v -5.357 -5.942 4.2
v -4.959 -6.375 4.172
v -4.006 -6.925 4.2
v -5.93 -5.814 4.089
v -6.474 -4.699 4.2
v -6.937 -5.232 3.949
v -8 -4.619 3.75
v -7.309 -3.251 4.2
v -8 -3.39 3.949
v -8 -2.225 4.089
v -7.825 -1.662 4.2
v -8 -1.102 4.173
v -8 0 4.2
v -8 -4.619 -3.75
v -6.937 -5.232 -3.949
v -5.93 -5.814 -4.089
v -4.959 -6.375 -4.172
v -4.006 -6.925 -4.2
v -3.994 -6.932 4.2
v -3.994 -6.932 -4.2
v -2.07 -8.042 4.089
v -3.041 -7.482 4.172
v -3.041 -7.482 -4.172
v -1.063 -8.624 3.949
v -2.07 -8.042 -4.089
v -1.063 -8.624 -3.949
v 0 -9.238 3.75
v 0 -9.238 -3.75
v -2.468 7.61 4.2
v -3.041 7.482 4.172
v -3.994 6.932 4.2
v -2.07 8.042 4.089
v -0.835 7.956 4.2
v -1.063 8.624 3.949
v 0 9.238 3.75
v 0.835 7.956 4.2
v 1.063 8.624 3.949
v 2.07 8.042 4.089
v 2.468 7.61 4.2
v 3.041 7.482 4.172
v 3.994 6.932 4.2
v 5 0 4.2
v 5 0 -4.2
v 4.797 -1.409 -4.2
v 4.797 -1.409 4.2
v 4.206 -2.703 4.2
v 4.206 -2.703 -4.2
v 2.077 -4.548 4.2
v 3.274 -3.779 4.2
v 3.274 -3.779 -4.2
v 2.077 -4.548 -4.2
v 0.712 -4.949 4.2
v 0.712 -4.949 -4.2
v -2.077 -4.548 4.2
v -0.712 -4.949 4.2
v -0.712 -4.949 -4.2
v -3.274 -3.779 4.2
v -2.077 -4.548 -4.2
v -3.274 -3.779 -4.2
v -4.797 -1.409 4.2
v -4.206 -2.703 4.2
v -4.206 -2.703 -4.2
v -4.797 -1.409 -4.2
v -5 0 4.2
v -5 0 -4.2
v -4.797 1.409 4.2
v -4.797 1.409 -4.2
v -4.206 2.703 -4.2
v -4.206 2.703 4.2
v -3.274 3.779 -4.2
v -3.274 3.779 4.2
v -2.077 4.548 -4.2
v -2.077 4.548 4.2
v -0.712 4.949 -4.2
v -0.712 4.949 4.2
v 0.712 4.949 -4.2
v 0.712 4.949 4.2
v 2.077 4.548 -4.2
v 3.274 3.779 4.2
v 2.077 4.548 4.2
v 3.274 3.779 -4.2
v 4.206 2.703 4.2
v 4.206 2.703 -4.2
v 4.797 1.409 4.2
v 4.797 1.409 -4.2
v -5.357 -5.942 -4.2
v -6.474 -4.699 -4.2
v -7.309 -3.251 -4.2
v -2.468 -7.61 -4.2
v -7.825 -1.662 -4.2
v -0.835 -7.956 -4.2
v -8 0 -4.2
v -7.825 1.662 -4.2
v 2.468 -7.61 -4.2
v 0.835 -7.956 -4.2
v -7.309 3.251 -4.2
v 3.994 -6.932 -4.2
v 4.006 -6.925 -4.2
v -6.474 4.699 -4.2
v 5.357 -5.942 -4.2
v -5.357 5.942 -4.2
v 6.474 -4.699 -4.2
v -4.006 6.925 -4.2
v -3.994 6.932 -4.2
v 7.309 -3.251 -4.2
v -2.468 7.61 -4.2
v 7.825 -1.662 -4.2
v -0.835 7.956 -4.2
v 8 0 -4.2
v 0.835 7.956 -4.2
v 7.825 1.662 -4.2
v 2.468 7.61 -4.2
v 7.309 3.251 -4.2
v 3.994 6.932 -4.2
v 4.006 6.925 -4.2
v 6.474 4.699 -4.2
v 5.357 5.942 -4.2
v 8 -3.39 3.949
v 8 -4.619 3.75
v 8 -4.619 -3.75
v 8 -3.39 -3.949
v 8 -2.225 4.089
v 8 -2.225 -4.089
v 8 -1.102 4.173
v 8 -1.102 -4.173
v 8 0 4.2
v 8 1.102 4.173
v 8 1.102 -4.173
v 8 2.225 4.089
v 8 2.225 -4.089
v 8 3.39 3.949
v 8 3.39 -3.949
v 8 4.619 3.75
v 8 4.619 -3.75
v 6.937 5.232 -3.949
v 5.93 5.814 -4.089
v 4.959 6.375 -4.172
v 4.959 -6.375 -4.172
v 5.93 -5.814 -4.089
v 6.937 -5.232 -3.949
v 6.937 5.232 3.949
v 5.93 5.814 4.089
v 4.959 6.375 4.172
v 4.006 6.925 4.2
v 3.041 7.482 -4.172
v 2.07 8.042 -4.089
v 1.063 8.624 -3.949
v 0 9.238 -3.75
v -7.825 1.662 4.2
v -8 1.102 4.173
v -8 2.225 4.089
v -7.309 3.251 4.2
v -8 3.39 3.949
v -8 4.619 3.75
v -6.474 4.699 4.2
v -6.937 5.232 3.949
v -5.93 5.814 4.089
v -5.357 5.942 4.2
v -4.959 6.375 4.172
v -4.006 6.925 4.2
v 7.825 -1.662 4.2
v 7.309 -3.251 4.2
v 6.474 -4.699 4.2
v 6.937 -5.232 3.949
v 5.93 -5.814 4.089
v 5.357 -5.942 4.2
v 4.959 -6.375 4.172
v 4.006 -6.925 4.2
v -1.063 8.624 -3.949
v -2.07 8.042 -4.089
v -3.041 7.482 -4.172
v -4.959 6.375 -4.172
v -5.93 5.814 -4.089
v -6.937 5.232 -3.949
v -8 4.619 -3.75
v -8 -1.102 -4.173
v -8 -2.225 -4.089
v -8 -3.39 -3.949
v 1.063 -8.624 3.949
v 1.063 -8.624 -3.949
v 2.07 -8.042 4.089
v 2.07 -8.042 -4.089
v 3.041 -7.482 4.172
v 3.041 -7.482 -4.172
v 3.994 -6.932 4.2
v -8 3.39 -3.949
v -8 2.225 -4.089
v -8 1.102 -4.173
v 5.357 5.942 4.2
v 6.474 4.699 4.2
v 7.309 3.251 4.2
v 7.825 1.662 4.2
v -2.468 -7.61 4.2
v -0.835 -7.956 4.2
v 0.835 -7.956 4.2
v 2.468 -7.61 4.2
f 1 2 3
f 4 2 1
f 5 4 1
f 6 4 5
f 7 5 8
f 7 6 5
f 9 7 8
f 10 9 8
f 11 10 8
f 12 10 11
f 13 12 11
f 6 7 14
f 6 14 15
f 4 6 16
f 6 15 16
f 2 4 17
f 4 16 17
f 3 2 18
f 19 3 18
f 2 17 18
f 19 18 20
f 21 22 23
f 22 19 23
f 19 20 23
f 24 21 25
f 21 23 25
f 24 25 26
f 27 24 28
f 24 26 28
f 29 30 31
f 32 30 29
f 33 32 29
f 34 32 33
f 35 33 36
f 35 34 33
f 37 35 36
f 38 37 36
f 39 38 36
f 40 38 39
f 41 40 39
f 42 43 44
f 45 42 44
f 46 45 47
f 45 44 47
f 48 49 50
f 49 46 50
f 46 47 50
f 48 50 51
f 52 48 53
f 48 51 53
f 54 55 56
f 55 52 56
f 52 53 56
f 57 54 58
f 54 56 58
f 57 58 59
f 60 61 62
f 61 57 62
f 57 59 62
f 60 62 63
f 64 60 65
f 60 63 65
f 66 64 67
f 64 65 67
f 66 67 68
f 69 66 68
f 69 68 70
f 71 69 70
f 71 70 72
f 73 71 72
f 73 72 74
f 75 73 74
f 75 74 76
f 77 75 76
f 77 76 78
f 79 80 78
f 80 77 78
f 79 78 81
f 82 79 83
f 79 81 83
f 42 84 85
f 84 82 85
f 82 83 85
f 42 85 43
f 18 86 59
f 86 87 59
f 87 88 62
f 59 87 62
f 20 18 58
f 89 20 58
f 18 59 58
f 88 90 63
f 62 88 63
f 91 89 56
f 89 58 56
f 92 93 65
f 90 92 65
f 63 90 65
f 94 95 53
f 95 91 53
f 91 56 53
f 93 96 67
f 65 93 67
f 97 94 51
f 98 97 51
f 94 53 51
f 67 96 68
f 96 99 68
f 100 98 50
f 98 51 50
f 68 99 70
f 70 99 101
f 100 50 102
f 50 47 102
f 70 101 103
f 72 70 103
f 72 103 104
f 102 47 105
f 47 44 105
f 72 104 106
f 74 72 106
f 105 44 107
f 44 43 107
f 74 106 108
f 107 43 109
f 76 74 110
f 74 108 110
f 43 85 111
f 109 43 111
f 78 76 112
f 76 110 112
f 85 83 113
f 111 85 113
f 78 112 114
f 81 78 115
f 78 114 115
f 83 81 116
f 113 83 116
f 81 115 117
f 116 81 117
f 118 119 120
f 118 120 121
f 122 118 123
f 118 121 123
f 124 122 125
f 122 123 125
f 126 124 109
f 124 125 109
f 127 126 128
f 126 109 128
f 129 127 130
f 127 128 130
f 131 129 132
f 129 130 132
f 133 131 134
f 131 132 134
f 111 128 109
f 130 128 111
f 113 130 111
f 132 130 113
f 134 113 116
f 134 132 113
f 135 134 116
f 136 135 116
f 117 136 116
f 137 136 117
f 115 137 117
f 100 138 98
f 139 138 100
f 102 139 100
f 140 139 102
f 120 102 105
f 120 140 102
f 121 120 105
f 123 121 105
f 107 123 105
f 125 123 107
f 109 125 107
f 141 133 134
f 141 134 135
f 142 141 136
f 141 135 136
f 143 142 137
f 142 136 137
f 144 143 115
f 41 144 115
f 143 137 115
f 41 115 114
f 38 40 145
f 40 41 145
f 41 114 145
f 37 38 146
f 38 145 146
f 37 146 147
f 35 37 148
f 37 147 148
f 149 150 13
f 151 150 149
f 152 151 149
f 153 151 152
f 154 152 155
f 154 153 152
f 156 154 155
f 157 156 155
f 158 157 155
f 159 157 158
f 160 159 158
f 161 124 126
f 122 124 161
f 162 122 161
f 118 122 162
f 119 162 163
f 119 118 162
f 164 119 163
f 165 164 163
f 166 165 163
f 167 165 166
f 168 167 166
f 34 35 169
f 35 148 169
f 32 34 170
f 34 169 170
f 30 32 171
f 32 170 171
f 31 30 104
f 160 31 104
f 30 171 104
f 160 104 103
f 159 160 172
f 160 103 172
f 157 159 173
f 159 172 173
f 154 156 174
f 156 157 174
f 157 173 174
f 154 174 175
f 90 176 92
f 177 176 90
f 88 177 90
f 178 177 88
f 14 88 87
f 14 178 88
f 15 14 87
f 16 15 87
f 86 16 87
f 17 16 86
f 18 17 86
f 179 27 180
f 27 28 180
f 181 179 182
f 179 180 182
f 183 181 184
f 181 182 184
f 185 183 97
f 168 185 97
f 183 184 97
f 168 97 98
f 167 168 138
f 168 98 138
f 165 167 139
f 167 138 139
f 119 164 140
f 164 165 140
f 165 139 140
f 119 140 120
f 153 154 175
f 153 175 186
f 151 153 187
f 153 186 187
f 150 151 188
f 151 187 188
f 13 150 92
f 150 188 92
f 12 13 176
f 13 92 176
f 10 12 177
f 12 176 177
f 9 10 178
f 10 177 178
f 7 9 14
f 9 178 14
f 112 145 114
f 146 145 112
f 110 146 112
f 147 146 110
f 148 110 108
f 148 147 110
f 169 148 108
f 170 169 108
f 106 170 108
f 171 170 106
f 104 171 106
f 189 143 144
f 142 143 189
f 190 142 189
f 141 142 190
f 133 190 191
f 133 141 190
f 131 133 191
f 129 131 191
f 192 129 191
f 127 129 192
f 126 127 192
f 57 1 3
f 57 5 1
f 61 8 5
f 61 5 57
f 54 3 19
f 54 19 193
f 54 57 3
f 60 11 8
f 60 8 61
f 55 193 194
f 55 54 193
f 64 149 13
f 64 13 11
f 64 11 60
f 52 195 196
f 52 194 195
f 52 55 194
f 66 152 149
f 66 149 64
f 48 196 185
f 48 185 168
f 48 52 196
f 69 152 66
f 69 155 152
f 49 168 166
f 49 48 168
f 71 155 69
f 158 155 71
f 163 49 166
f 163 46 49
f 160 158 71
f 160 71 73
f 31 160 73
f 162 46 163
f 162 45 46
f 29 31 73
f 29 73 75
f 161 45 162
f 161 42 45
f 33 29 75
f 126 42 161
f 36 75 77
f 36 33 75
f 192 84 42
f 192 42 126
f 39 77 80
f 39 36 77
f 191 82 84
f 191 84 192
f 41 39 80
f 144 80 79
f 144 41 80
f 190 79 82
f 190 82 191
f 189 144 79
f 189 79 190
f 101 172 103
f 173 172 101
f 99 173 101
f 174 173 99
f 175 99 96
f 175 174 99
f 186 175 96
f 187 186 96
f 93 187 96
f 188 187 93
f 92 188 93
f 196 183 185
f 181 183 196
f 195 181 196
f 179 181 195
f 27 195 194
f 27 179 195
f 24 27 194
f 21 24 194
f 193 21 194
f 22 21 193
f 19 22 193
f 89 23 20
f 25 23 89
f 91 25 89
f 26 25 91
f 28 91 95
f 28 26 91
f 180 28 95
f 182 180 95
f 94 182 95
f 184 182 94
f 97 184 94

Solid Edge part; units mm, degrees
sketch "Sketch1" plane through (0, 0, 0) normal (0, 0, 1) x (1, 0, 0)
  line L0 (0, -9.2376) -> (8, -4.6188)
  line L1 (8, -4.6188) -> (8, 4.6188)
  line L2 (8, 4.6188) -> (0, 9.2376)
  line L3 (0, 9.2376) -> (-8, 4.6188)
  line L4 (-8, 4.6188) -> (-8, -4.6188)
  line L5 (-8, -4.6188) -> (0, -9.2376)
  circle A0 centre (0, 0) radius 5
  dimension "D1" = 16
  dimension "D2" = 10
extrude "Protrusion1" add sketch "Sketch1" along normal mid plane 8.4
sketch "Sketch2" plane through (0, 0, 0) normal (0, -1, 0) x (1, 0, 0)
  line L0 (8, 4.2) -> (0, 7.1118)
revolve "RevolvedCutout1" cut sketch "Sketch2" angle 360 about axis through (0, 0, 6.3658) along (0, 0, -1) material side at (4.0171, 0, 5.7029)
mirror "Mirror1" about plane through (0, 0, 0) normal (0, 0, 1) of "RevolvedCutout1"
